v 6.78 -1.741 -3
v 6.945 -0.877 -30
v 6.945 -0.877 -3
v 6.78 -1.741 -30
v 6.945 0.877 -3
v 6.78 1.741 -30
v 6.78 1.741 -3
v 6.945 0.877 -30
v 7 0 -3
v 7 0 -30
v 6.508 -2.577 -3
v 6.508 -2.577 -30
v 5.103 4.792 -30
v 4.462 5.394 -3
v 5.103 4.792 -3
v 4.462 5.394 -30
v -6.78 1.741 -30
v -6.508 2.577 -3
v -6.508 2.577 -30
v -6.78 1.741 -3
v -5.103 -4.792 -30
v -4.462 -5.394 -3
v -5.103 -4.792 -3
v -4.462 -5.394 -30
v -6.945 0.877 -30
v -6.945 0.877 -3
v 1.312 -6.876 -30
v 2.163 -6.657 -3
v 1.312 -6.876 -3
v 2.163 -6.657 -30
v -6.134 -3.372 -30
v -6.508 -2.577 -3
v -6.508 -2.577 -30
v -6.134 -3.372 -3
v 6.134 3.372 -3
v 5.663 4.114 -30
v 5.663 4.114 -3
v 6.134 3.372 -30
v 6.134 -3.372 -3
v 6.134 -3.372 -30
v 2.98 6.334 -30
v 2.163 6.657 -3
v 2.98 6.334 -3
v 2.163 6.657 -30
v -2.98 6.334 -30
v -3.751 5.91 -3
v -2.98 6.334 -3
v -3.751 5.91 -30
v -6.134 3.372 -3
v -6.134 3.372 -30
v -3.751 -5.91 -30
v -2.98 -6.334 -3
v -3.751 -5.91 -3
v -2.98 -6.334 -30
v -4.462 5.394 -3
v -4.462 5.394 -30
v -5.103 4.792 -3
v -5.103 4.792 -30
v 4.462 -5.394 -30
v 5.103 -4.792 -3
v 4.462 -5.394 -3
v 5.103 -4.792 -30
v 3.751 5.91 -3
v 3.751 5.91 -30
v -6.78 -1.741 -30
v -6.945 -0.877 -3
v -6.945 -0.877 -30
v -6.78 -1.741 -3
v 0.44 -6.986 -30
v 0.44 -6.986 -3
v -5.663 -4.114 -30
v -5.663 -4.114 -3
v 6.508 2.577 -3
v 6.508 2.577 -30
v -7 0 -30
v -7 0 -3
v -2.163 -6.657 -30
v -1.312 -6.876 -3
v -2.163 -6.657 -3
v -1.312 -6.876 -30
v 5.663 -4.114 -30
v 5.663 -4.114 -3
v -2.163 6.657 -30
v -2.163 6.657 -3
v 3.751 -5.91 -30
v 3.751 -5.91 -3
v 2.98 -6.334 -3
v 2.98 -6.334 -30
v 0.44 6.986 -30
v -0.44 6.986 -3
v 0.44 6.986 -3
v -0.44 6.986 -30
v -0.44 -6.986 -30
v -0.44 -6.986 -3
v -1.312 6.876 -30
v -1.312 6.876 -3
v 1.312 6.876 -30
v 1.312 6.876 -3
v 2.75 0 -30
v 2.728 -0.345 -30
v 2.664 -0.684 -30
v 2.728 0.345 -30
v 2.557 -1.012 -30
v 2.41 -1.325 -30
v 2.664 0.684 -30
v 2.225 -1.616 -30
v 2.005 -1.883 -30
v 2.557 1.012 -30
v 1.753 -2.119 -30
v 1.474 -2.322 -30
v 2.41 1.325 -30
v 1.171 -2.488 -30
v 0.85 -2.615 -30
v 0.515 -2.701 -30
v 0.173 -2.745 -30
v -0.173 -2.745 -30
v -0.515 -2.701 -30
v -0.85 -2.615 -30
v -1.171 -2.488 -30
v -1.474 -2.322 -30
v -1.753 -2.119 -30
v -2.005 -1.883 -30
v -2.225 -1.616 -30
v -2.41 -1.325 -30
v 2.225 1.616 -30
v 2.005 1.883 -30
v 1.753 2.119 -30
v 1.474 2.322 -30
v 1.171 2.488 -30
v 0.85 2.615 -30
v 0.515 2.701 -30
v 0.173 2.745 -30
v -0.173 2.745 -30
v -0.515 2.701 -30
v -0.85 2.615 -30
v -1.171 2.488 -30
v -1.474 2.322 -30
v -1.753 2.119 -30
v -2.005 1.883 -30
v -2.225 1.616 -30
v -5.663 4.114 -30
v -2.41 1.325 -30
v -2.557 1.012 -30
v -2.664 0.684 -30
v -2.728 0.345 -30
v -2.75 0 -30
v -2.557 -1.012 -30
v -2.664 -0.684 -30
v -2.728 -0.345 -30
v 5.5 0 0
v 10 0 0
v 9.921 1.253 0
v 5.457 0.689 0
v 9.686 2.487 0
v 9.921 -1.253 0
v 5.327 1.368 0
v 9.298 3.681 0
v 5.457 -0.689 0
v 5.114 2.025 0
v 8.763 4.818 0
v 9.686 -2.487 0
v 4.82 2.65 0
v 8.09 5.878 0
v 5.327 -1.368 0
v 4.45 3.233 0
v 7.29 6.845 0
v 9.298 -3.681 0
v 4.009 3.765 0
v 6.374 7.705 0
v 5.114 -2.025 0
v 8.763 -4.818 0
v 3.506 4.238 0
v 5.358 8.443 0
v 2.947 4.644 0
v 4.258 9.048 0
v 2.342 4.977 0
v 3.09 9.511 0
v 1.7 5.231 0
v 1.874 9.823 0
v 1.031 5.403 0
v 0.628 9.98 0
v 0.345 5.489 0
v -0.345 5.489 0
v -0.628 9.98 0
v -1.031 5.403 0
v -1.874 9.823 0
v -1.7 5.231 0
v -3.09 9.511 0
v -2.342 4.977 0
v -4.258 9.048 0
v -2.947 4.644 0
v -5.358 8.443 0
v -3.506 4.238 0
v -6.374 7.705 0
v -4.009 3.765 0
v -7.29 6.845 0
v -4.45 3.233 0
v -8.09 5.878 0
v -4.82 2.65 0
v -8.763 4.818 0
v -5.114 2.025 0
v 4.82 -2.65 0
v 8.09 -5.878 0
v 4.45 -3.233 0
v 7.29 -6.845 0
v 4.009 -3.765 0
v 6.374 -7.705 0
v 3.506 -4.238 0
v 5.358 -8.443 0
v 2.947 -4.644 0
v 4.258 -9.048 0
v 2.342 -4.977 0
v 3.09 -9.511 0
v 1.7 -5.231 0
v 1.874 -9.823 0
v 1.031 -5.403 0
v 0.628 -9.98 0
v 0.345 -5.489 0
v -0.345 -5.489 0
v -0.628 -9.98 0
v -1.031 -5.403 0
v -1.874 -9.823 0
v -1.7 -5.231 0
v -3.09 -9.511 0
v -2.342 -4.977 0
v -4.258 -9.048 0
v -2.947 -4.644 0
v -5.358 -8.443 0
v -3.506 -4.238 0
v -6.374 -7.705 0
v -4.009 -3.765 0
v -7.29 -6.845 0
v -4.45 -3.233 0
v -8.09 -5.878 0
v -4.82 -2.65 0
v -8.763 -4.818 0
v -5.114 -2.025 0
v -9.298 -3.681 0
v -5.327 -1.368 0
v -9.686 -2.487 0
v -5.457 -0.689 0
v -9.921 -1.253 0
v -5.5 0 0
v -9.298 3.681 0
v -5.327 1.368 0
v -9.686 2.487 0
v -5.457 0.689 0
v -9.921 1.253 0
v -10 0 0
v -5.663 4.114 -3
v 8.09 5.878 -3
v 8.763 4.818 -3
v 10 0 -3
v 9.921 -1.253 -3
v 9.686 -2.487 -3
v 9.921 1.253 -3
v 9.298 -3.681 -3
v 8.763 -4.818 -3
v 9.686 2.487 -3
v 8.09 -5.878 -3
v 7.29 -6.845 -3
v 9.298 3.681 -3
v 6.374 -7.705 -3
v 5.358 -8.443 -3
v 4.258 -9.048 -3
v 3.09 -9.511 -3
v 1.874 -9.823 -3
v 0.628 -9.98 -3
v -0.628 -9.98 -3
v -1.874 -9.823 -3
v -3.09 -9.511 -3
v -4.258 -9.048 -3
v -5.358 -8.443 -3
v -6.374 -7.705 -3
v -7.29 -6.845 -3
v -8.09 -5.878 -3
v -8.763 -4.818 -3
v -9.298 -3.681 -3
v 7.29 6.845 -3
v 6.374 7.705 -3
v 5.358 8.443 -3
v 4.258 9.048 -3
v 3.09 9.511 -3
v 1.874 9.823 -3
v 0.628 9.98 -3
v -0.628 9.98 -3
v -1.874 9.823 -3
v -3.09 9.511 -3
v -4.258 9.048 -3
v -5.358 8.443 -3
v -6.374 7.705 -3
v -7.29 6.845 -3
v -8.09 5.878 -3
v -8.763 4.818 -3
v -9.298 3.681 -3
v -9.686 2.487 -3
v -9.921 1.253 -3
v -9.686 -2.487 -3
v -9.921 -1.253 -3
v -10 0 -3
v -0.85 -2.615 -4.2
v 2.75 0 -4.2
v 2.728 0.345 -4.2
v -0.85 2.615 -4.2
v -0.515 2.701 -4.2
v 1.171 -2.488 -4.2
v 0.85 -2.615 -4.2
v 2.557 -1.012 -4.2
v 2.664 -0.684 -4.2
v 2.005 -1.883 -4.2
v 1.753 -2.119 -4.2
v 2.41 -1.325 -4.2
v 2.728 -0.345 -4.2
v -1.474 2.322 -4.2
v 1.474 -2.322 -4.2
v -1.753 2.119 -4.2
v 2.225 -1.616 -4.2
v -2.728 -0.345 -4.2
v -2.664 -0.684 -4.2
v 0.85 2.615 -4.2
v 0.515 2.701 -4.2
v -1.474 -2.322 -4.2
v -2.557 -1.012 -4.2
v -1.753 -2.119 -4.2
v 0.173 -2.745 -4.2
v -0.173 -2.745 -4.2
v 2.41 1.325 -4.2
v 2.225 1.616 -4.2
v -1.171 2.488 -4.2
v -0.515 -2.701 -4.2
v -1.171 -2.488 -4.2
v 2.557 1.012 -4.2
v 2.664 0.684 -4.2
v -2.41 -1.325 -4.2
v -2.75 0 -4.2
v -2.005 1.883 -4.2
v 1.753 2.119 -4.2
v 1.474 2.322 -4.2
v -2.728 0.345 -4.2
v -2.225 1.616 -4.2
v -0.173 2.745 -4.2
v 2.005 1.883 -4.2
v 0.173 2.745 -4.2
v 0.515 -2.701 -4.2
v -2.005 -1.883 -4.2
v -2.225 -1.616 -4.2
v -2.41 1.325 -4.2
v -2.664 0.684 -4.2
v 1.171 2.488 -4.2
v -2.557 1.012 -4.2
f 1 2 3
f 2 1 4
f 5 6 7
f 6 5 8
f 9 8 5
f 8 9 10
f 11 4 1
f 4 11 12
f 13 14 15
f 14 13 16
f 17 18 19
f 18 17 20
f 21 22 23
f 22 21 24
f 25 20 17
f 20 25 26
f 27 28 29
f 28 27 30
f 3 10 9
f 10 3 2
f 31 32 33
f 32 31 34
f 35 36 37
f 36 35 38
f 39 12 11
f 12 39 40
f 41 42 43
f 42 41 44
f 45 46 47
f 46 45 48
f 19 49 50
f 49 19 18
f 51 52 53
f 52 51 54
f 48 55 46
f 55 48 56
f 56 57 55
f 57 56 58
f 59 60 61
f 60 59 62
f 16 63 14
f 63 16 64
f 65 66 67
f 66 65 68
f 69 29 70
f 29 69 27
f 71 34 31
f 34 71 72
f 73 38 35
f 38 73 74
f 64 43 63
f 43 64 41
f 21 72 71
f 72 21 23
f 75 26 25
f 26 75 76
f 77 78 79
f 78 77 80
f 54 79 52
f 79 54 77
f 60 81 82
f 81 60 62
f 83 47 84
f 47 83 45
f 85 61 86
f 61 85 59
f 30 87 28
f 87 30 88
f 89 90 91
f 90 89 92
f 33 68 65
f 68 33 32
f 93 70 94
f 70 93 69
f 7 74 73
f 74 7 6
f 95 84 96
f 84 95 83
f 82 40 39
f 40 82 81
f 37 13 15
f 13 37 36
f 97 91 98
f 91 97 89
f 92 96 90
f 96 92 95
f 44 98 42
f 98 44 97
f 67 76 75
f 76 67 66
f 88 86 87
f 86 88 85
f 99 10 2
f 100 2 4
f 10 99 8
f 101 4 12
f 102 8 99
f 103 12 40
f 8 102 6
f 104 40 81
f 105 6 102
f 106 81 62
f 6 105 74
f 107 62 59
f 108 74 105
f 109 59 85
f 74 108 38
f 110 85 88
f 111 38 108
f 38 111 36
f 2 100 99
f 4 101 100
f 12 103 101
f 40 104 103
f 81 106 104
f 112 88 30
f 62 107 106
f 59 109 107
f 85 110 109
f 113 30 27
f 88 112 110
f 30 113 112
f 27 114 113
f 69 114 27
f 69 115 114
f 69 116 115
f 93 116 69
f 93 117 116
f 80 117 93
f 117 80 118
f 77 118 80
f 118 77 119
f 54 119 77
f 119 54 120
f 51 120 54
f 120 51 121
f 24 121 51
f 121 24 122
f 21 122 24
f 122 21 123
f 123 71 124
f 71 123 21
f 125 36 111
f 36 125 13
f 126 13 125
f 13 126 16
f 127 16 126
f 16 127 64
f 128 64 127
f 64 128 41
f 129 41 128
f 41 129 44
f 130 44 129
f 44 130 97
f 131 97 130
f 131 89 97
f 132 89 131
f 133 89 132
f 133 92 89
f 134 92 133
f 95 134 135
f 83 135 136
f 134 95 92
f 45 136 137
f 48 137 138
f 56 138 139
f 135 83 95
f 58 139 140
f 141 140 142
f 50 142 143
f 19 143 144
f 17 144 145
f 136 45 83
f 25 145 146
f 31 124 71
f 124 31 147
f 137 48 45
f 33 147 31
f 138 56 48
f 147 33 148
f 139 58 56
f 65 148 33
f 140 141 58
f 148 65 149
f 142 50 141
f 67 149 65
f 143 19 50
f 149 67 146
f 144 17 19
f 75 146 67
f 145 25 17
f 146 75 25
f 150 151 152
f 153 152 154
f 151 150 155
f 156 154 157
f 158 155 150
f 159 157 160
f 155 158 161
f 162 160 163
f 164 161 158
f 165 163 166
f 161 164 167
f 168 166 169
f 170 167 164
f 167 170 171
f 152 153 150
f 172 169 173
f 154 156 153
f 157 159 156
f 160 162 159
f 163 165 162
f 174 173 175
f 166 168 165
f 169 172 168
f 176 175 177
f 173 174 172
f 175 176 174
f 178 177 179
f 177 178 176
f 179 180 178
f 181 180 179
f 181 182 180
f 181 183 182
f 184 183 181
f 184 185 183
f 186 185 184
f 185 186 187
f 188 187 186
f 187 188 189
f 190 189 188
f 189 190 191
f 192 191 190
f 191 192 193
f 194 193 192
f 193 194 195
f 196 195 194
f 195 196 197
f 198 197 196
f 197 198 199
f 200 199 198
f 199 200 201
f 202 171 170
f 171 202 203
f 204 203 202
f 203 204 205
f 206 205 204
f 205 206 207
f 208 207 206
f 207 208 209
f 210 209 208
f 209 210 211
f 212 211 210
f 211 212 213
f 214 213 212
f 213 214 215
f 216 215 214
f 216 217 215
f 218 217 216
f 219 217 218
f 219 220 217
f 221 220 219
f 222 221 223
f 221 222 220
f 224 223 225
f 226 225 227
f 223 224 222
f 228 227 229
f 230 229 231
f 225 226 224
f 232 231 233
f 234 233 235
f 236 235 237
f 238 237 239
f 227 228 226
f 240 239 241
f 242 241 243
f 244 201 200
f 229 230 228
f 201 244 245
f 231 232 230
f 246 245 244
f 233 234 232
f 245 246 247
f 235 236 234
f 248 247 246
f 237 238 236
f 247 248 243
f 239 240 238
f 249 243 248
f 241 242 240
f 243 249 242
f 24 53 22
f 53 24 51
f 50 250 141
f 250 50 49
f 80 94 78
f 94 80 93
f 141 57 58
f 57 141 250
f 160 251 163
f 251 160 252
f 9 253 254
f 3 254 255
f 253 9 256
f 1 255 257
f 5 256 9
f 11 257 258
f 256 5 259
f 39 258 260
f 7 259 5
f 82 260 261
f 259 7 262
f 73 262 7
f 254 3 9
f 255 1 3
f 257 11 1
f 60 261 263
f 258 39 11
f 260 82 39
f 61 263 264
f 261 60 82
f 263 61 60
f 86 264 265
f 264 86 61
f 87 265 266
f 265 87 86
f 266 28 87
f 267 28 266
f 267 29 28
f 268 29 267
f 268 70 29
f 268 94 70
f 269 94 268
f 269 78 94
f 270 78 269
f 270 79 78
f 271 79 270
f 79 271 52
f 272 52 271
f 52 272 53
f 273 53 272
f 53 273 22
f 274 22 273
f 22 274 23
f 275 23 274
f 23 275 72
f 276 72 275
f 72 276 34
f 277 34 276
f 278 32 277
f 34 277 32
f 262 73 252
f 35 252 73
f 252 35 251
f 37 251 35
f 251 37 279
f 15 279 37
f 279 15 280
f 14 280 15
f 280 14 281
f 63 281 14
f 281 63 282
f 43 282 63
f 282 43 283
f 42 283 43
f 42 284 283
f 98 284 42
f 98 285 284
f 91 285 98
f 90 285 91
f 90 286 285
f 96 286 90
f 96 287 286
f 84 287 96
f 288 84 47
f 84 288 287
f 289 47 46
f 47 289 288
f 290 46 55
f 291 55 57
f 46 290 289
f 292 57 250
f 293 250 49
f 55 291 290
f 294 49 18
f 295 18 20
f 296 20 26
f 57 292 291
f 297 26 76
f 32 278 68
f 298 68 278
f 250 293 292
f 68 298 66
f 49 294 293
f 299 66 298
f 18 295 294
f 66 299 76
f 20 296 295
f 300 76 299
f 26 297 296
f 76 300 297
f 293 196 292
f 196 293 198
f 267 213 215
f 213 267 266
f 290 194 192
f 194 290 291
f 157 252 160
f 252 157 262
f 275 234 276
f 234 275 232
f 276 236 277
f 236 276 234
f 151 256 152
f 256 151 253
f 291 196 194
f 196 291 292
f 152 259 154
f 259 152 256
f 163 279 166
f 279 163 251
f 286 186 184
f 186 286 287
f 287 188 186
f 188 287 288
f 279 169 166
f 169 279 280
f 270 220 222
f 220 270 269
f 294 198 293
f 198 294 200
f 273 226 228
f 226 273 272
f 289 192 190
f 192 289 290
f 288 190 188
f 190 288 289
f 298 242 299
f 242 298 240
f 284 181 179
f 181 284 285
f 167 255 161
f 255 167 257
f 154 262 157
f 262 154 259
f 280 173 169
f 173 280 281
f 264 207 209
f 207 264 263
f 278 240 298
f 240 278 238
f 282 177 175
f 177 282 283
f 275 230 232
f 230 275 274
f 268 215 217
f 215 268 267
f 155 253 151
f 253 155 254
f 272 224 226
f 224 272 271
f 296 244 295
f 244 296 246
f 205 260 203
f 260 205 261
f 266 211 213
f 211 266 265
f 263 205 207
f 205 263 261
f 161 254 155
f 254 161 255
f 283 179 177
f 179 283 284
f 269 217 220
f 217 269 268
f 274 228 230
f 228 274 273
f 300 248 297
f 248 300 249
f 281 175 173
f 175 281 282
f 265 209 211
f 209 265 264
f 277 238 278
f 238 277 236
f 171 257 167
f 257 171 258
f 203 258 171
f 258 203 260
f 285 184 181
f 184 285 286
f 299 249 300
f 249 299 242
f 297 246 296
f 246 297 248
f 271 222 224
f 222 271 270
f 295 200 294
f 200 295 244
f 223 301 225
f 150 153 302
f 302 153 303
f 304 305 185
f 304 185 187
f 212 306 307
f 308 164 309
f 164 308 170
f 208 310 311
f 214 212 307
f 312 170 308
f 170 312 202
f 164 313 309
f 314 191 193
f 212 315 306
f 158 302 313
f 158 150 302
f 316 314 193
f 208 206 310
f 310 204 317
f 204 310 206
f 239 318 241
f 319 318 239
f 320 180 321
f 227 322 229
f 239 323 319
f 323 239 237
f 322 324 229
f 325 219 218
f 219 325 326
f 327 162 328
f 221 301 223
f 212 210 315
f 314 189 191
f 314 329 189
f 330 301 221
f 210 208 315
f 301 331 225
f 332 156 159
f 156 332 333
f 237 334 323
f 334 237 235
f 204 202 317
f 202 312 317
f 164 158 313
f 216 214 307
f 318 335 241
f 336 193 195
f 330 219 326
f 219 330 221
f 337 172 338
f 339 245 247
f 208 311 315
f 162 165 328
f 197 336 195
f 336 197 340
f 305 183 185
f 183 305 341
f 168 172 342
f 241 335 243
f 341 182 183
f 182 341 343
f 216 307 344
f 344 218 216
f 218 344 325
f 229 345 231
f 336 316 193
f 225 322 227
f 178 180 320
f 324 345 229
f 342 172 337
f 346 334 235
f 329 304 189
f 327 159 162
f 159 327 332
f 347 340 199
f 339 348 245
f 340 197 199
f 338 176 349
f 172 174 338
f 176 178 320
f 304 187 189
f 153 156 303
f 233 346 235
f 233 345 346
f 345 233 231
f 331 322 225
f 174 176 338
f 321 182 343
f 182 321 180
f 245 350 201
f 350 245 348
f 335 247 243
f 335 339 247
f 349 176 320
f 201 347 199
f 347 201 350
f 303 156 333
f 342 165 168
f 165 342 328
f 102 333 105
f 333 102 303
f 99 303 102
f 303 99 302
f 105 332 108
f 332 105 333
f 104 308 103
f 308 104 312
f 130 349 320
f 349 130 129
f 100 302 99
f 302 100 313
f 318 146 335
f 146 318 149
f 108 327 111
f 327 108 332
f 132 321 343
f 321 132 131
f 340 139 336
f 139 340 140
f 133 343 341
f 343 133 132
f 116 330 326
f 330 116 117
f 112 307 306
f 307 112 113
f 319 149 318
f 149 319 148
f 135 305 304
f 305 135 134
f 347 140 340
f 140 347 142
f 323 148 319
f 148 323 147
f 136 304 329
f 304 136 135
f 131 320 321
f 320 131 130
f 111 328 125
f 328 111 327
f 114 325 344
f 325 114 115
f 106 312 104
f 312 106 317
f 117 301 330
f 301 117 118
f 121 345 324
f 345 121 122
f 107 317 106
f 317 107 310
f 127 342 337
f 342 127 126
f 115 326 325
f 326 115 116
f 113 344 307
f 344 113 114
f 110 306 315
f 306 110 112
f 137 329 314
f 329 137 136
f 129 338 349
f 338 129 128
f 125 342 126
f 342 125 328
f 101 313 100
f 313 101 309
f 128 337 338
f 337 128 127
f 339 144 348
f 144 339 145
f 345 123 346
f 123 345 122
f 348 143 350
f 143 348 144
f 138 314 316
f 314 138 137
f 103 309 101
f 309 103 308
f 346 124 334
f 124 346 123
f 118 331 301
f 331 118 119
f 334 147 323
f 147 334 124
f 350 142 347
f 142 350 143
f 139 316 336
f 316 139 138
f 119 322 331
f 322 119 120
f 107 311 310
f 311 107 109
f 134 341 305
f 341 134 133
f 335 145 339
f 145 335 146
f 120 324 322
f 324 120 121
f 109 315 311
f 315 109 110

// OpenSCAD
$fn = 50;


difference() {
	union() {
		translate(v = [0, 0, -30.0000000000]) {
			cylinder(h = 30, r = 7.0000000000);
		}
		translate(v = [0, 0, -3.0000000000]) {
			cylinder(h = 3, r = 10.0000000000);
		}
	}
	union() {
		translate(v = [0, 0, 0]) {
			rotate(a = [0, 0, 0]) {
				difference() {
					union() {
						#translate(v = [0, 0, -30.0000000000]) {
							cylinder(h = 30, r = 2.2500000000);
						}
						#translate(v = [0, 0, -4.2000000000]) {
							cylinder(h = 4.2000000000, r1 = 2.7500000000, r2 = 5.5000000000);
						}
						#translate(v = [0, 0, -30.0000000000]) {
							cylinder(h = 30, r = 2.7500000000);
						}
						#translate(v = [0, 0, -30.0000000000]) {
							cylinder(h = 30, r = 2.2500000000);
						}
					}
					union();
				}
			}
		}
	}
}
